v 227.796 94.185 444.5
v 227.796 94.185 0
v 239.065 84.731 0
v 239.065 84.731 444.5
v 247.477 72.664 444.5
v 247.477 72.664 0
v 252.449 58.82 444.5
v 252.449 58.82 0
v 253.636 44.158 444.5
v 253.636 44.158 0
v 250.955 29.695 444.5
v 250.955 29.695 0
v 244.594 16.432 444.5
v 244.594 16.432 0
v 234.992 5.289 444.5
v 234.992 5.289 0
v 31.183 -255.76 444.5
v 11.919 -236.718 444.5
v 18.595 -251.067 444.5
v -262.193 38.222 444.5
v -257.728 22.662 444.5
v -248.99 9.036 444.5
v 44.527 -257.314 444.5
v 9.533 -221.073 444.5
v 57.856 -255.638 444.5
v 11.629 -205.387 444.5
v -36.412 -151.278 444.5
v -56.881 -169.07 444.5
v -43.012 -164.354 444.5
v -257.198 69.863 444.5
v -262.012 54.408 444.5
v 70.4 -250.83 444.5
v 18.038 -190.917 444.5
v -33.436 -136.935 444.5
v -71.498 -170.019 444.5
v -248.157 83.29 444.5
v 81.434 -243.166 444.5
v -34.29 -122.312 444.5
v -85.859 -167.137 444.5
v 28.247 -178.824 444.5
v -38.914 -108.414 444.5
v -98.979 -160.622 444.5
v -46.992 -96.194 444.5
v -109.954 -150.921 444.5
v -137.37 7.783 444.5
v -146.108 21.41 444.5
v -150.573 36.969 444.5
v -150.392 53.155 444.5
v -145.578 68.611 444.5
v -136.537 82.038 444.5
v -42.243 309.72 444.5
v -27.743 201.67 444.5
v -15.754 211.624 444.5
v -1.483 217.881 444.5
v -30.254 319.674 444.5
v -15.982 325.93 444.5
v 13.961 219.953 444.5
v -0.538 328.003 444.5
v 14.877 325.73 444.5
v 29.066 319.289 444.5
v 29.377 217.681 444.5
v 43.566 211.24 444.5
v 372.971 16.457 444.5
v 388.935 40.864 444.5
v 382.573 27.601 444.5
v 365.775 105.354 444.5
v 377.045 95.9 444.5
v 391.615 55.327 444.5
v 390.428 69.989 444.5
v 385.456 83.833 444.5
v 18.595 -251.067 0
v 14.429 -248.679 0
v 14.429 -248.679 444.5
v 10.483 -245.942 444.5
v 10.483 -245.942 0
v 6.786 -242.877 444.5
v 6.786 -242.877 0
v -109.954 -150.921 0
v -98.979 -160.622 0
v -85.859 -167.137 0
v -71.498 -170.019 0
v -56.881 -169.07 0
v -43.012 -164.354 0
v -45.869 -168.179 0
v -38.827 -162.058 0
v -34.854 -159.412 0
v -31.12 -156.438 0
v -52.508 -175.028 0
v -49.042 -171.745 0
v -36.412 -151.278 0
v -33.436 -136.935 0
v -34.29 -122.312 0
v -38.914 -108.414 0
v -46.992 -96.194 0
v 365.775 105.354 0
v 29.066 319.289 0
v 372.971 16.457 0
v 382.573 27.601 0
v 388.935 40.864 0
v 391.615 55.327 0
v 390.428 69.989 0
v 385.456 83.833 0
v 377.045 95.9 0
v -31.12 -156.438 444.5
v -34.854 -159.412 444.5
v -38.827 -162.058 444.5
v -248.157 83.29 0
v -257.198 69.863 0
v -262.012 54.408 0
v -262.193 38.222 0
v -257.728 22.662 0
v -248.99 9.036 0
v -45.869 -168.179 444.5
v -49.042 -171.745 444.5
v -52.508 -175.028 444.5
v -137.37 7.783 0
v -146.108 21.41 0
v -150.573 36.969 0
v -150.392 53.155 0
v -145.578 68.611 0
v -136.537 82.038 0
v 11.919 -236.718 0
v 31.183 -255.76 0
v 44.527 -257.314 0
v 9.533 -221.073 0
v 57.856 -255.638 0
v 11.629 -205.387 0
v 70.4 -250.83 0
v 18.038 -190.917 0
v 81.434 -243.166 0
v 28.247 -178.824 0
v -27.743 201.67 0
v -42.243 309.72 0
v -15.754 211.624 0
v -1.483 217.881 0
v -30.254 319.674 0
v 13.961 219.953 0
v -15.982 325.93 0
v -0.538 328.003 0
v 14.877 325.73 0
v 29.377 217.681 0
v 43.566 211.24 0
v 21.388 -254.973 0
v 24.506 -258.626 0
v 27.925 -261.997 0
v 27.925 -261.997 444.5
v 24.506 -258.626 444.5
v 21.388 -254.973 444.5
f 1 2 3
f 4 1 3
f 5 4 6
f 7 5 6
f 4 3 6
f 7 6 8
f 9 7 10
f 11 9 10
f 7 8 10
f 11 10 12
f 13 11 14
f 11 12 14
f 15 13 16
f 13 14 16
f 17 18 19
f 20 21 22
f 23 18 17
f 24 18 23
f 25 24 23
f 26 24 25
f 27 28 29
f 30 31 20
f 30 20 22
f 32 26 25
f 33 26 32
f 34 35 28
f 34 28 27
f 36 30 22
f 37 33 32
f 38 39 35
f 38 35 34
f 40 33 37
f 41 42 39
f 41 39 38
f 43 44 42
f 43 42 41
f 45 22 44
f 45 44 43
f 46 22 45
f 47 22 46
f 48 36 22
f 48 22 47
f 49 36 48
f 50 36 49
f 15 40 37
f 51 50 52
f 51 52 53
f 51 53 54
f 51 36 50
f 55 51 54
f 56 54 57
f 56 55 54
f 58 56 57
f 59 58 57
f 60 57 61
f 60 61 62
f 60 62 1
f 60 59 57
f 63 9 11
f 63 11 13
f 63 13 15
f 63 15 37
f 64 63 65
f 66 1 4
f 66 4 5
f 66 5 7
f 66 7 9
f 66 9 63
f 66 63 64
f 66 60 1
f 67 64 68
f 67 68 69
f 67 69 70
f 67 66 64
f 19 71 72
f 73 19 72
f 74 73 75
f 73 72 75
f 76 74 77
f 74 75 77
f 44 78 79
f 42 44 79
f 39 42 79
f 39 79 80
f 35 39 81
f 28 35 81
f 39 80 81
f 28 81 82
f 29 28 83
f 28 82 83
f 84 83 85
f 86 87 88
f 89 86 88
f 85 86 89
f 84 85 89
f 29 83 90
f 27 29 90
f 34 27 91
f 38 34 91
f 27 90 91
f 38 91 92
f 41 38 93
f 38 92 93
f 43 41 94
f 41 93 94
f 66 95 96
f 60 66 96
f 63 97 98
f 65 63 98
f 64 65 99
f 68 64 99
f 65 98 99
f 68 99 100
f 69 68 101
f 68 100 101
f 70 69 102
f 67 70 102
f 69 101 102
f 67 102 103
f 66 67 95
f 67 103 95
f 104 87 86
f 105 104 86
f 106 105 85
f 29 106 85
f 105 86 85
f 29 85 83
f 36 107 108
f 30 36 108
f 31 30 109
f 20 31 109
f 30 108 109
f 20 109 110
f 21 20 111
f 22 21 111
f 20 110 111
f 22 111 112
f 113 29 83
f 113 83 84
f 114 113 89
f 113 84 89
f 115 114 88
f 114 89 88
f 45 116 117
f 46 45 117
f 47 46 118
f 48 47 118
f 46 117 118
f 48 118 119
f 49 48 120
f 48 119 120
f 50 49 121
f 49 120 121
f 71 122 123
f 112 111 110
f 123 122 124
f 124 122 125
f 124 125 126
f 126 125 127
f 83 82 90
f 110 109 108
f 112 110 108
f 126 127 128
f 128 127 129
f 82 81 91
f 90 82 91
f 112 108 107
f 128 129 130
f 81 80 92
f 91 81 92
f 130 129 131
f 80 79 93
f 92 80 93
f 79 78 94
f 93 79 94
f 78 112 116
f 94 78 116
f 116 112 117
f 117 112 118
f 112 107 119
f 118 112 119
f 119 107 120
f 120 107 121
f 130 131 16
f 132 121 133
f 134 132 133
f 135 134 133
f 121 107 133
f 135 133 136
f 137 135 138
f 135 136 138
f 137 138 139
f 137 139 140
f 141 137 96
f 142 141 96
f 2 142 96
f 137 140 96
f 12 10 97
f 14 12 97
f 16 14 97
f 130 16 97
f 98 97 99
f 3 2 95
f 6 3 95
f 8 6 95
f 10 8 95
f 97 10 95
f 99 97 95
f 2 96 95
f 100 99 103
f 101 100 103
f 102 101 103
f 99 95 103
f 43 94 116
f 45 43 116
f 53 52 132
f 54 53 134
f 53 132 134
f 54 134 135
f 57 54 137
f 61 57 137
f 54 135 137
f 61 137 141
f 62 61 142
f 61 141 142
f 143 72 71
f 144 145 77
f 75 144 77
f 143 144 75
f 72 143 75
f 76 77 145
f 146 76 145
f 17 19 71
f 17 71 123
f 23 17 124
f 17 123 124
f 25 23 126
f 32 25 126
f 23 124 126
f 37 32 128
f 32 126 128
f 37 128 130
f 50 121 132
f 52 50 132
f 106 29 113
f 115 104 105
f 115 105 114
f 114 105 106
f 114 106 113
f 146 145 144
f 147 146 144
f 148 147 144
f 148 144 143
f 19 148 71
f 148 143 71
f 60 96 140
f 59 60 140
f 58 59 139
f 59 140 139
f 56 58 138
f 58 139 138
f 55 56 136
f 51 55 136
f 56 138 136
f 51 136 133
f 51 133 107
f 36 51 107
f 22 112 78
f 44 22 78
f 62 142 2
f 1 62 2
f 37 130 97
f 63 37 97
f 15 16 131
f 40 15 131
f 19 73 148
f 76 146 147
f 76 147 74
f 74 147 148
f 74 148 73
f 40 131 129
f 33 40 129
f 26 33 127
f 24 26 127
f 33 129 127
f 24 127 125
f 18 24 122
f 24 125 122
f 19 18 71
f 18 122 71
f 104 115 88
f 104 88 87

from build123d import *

# Parameters (mm, degrees)
F2_DEPTH = 444.5


# Not quite as in the source:
# - the program builds the solid bodies; features that only make, move or delete a surface that nothing else refers to are left out


with BuildPart() as f2:
    # F0 (on Top) → F2 (new body)
    with BuildSketch(Plane.XY):
        with BuildLine():
            ThreePointArc((27.9253781423, -261.9974371284), (22.9075756056, -256.8332185716), (18.5954934194, -251.0666387518))
            ThreePointArc((18.5954934194, -251.0666387518), (12.4265327198, -247.3529587055), (6.7863258601, -242.8768485437))
            Line((6.7863258601, -242.8768485437), (27.9253781423, -261.9974371284))
        make_face()
    extrude(amount=F2_DEPTH)


with BuildPart() as f2b:
    # F0 (on Top) → F2, piece 2 (new body)
    with BuildSketch(Plane.XY):
        with BuildLine():
            ThreePointArc((-31.1204911076, -156.4375346544), (-36.8123563953, -160.777560461), (-43.0123050994, -164.3544013187))
            ThreePointArc((-43.0123050994, -164.3544013187), (-47.417706923, -169.9958186255), (-52.5081003988, -175.0278210814))
            Line((-52.5081003988, -175.0278210814), (-31.1204911076, -156.4375346544))
        make_face()
    extrude(amount=F2_DEPTH)


with BuildPart() as f2c:
    # F0 (on Top) → F2, piece 3 (new body)
    with BuildSketch(Plane.XY):
        with BuildLine():
            Line((-248.9900153466, 9.0356711772), (-109.9539944558, -150.9214173747))
            ThreePointArc((-109.9539944558, -150.9214173747), (-78.773286297, -169.0505342784), (-43.0123050994, -164.3544013187))
            ThreePointArc((-43.0123050994, -164.3544013187), (-33.3817999447, -129.5958798966), (-46.991983119, -96.1943177332))
            Line((-46.991983119, -96.1943177332), (-137.3700341689, 7.7831251072))
            ThreePointArc((-137.3700341689, 7.7831251072), (-151.071705911, 45.068837312), (-136.5367849162, 82.0376919712))
            Line((-136.5367849162, 82.0376919712), (-27.7431442317, 201.6704729463))
            ThreePointArc((-27.7431442317, 201.6704729463), (6.1663489106, 219.4581595516), (43.5656902405, 211.2395959291))
            Line((43.5656902405, 211.2395959291), (227.7961883679, 94.1848714271))
            ThreePointArc((227.7961883679, 94.1848714271), (253.5267437249, 51.5283411547), (234.9918947151, 5.2887431239))
            Line((234.9918947151, 5.2887431239), (28.2474067267, -178.8241948134))
            ThreePointArc((28.2474067267, -178.8241948134), (10.0225407283, -213.1552626245), (18.5954934194, -251.0666387518))
            ThreePointArc((18.5954934194, -251.0666387518), (51.2422832265, -256.8782248907), (81.4343139607, -243.1658692103))
            Line((81.4343139607, -243.1658692103), (372.971118428, 16.4574857317))
            ThreePointArc((372.971118428, 16.4574857317), (391.5059674378, 62.6970837625), (365.7754120808, 105.3536140349))
            Line((365.7754120808, 105.3536140349), (29.0662717973, 319.2888530632))
            ThreePointArc((29.0662717973, 319.2888530632), (-8.3330695326, 327.5074166856), (-42.2425626749, 309.7197300804))
            Line((-42.2425626749, 309.7197300804), (-248.1567660939, 83.2902380412))
            ThreePointArc((-248.1567660939, 83.2902380412), (-262.6916870886, 46.3213833819), (-248.9900153466, 9.0356711772))
        make_face()
    extrude(amount=F2_DEPTH)


solid = Compound([f2.part, f2b.part, f2c.part])
